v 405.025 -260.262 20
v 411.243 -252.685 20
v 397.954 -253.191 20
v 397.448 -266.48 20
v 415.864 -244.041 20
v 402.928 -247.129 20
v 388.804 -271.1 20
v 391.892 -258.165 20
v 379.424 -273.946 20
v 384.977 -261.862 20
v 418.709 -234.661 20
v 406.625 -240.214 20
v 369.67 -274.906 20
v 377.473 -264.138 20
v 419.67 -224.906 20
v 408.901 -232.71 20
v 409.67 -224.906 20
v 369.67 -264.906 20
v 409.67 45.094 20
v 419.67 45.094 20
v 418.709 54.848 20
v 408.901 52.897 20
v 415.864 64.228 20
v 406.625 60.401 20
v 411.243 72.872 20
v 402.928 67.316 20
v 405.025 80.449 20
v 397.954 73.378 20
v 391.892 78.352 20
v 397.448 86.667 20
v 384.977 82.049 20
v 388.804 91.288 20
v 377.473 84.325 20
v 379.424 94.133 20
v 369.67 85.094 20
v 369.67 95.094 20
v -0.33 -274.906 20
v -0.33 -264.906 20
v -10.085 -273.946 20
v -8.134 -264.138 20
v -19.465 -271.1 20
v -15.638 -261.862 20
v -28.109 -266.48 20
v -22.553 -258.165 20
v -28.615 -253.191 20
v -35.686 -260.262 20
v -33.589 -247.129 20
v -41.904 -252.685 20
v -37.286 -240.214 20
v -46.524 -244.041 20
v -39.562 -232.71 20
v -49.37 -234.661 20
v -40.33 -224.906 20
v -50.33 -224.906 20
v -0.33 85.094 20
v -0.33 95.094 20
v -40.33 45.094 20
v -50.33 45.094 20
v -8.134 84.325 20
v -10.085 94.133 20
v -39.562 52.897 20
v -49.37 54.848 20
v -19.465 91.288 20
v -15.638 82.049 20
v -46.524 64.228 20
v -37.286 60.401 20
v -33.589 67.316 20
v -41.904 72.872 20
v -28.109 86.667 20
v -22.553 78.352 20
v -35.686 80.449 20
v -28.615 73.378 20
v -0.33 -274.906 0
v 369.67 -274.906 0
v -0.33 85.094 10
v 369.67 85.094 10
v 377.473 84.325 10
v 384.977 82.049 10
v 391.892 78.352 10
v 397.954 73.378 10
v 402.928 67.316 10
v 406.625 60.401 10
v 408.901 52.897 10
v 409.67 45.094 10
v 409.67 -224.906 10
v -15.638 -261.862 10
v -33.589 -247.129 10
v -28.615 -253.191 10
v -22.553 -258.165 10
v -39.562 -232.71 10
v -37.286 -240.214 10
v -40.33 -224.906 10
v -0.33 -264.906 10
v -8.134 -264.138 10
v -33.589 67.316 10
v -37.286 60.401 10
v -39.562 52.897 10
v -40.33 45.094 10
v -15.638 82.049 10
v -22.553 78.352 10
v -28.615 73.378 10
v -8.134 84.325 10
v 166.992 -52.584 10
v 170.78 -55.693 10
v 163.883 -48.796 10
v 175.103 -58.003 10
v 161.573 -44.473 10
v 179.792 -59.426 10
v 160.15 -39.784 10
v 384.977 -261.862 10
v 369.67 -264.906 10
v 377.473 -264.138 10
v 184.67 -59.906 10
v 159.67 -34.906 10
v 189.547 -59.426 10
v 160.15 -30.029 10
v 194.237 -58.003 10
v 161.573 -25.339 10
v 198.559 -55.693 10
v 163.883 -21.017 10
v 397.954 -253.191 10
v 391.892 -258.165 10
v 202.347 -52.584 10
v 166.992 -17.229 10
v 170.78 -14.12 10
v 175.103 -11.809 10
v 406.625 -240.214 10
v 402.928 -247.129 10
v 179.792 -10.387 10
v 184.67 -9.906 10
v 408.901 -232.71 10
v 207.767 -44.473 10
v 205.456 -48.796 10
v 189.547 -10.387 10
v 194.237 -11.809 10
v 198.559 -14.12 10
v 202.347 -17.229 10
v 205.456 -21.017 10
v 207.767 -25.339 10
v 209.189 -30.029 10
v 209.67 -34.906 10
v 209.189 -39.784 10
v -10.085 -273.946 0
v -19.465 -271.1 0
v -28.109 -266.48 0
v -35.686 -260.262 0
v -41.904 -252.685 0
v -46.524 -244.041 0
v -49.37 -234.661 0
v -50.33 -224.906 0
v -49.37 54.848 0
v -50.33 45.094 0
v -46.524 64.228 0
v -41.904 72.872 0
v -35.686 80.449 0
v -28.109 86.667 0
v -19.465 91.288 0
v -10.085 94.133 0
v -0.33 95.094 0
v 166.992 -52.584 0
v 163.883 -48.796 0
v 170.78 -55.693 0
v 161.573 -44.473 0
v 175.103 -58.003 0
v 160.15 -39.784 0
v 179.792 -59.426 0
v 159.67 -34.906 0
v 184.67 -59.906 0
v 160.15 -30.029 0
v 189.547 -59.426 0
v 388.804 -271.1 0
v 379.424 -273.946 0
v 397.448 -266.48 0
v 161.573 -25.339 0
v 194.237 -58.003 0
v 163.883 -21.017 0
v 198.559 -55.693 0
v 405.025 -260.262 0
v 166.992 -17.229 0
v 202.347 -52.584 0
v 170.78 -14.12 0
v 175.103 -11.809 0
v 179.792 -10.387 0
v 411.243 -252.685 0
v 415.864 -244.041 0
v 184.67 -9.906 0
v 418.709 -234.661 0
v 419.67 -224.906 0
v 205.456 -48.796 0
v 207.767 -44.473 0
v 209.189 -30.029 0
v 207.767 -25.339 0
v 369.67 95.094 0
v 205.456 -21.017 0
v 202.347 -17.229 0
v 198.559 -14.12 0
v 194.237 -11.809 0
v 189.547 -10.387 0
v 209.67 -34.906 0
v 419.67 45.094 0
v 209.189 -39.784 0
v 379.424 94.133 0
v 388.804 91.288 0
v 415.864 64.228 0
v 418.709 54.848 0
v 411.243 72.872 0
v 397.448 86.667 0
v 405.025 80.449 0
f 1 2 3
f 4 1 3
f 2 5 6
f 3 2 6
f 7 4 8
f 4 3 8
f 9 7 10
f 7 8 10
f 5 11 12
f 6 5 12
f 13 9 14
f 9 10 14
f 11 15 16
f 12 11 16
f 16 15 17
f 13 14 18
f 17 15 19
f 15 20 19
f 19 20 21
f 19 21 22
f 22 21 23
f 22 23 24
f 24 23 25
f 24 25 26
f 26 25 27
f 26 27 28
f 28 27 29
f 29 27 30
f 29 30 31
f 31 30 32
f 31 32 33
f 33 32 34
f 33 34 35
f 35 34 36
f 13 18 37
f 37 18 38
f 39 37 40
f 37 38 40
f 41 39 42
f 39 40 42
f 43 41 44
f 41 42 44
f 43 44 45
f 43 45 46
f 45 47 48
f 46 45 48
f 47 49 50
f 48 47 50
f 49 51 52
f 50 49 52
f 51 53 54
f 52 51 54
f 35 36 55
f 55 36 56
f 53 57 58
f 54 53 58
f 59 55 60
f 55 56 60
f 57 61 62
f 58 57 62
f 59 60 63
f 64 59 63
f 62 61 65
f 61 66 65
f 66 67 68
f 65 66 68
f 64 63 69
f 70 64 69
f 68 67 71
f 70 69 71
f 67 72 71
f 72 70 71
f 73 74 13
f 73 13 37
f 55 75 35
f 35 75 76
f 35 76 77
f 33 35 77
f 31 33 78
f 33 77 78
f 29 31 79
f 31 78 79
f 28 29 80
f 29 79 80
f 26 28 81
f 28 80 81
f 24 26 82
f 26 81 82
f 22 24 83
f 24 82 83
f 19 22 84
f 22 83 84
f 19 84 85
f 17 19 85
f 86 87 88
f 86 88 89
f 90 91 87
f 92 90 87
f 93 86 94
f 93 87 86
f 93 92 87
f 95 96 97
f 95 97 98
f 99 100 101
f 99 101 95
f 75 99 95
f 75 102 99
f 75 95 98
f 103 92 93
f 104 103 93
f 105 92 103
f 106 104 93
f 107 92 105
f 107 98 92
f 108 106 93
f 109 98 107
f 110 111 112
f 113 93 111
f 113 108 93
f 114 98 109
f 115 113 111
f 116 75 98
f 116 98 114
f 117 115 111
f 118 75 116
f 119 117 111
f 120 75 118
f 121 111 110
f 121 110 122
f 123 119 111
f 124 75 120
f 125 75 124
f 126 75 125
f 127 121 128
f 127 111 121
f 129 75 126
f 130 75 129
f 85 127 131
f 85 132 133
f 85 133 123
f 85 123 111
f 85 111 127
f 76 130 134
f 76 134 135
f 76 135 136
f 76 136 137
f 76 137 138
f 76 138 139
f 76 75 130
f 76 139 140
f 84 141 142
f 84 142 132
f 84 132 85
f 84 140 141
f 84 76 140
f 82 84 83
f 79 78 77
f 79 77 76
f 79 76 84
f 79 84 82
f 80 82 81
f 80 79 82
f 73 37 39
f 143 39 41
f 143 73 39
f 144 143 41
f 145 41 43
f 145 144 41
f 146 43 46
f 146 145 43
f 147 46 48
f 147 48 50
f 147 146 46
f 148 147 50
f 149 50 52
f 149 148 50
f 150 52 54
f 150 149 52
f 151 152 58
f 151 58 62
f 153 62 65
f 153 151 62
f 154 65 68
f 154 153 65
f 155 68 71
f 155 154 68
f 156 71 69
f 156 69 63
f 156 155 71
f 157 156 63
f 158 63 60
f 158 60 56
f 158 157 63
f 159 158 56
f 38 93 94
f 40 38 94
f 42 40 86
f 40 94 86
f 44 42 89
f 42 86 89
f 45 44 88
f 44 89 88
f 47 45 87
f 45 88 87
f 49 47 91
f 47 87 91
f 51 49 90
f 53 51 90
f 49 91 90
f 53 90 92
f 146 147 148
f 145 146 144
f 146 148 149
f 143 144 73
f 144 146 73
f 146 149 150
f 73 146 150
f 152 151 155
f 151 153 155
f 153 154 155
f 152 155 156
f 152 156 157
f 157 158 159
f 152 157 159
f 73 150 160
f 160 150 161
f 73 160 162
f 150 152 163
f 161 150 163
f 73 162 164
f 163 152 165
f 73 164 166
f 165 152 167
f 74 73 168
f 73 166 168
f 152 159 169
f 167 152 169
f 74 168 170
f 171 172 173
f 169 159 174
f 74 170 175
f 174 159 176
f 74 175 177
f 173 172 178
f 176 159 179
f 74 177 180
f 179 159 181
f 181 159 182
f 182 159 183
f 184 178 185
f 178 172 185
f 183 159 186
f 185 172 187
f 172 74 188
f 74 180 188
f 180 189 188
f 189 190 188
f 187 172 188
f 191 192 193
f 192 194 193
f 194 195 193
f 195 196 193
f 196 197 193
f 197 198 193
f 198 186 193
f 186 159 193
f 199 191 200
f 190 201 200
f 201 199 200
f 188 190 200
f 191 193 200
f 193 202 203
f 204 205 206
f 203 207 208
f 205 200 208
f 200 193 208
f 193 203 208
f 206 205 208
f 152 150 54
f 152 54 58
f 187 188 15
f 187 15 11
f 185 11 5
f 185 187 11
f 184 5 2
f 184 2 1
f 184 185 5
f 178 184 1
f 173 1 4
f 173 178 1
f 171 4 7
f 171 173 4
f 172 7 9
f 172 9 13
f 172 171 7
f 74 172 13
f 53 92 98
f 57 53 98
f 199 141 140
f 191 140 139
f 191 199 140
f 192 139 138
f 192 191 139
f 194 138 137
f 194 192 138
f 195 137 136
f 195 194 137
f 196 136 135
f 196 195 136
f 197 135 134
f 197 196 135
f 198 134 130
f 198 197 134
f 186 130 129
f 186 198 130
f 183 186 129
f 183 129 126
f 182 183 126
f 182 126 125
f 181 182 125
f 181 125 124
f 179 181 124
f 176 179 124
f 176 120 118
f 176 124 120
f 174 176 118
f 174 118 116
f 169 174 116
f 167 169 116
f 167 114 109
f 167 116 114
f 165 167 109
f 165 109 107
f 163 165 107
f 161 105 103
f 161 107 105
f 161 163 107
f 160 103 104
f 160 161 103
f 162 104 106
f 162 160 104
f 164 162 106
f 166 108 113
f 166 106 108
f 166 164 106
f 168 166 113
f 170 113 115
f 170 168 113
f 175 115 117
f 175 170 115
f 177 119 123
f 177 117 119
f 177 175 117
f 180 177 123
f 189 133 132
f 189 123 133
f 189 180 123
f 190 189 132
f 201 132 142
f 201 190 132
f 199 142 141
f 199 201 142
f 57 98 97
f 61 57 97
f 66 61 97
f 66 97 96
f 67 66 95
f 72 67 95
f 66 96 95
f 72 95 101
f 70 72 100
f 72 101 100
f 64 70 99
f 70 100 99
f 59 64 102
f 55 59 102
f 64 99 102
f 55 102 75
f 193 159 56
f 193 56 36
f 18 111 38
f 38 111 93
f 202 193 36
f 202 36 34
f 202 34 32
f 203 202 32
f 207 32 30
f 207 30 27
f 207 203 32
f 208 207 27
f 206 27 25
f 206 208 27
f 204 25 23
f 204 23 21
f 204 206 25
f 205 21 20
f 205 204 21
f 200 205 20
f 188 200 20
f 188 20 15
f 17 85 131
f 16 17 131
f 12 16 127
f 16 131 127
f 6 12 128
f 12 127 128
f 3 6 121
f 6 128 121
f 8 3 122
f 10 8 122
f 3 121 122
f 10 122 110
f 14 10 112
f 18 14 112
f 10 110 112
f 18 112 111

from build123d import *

# Parameters (mm, degrees)
AUFSATZ_LINEAR_AUSTRAGEN1_DEPTH = 20
AUFSATZ_LINEAR_AUSTRAGEN2_DEPTH = 10
SKIZZE3_R                       = 25
SCHNITT_LINEAR_AUSTRAGEN1_DEPTH = 15


with BuildPart() as part:
    # Skizze1 → Aufsatz-Linear austragen1 (new body)
    with BuildSketch(Plane.XY):
        with BuildLine():
            Line((-0.330334949, 95.09360025), (369.669665051, 95.09360025))
            ThreePointArc((369.669665051, 95.09360025), (405.02500411, 80.448939309), (419.669665051, 45.09360025))
            Line((419.669665051, 45.09360025), (419.669665051, -224.90639975))
            ThreePointArc((419.669665051, -224.90639975), (405.02500411, -260.26173881), (369.669665051, -274.90639975))
            Line((369.669665051, -274.90639975), (-0.330334949, -274.90639975))
            ThreePointArc((-0.330334949, -274.90639975), (-35.685674008, -260.26173881), (-50.330334949, -224.90639975))
            Line((-50.330334949, -224.90639975), (-50.330334949, 45.09360025))
            ThreePointArc((-50.330334949, 45.09360025), (-35.685674008, 80.448939309), (-0.330334949, 95.09360025))
        make_face()
        with BuildLine():
            Line((-0.330334949, 85.09360025), (369.669665051, 85.09360025))
            ThreePointArc((369.669665051, 85.09360025), (397.953936298, 73.377871497), (409.669665051, 45.09360025))
            Line((409.669665051, 45.09360025), (409.669665051, -224.90639975))
            ThreePointArc((409.669665051, -224.90639975), (397.953936298, -253.190670998), (369.669665051, -264.90639975))
            Line((369.669665051, -264.90639975), (-0.330334949, -264.90639975))
            ThreePointArc((-0.330334949, -264.90639975), (-28.614606196, -253.190670998), (-40.330334949, -224.90639975))
            Line((-40.330334949, -224.90639975), (-40.330334949, 45.09360025))
            ThreePointArc((-40.330334949, 45.09360025), (-28.614606196, 73.377871497), (-0.330334949, 85.09360025))
        make_face(mode=Mode.SUBTRACT)
    extrude(amount=AUFSATZ_LINEAR_AUSTRAGEN1_DEPTH)

    # Skizze2 → Aufsatz-Linear austragen2 (add)
    with BuildSketch(Plane.XY):
        with BuildLine():
            Line((-0.330334949, -264.90639975), (369.669665051, -264.90639975))
            ThreePointArc((369.669665051, -264.90639975), (397.953936298, -253.190670998), (409.669665051, -224.90639975))
            Line((409.669665051, -224.90639975), (409.669665051, 45.09360025))
            ThreePointArc((409.669665051, 45.09360025), (397.953936298, 73.377871497), (369.669665051, 85.09360025))
            Line((369.669665051, 85.09360025), (-0.330334949, 85.09360025))
            ThreePointArc((-0.330334949, 85.09360025), (-28.614606196, 73.377871497), (-40.330334949, 45.09360025))
            Line((-40.330334949, 45.09360025), (-40.330334949, -224.90639975))
            ThreePointArc((-40.330334949, -224.90639975), (-28.614606196, -253.190670998), (-0.330334949, -264.90639975))
        make_face()
    extrude(amount=AUFSATZ_LINEAR_AUSTRAGEN2_DEPTH)

    # Skizze3 → Schnitt-Linear austragen1 (cut)
    with BuildSketch(Plane.XY):
        with Locations((184.669665051, -34.90639975)):
            Circle(SKIZZE3_R)
    extrude(amount=SCHNITT_LINEAR_AUSTRAGEN1_DEPTH, mode=Mode.SUBTRACT)


solid = part.part
